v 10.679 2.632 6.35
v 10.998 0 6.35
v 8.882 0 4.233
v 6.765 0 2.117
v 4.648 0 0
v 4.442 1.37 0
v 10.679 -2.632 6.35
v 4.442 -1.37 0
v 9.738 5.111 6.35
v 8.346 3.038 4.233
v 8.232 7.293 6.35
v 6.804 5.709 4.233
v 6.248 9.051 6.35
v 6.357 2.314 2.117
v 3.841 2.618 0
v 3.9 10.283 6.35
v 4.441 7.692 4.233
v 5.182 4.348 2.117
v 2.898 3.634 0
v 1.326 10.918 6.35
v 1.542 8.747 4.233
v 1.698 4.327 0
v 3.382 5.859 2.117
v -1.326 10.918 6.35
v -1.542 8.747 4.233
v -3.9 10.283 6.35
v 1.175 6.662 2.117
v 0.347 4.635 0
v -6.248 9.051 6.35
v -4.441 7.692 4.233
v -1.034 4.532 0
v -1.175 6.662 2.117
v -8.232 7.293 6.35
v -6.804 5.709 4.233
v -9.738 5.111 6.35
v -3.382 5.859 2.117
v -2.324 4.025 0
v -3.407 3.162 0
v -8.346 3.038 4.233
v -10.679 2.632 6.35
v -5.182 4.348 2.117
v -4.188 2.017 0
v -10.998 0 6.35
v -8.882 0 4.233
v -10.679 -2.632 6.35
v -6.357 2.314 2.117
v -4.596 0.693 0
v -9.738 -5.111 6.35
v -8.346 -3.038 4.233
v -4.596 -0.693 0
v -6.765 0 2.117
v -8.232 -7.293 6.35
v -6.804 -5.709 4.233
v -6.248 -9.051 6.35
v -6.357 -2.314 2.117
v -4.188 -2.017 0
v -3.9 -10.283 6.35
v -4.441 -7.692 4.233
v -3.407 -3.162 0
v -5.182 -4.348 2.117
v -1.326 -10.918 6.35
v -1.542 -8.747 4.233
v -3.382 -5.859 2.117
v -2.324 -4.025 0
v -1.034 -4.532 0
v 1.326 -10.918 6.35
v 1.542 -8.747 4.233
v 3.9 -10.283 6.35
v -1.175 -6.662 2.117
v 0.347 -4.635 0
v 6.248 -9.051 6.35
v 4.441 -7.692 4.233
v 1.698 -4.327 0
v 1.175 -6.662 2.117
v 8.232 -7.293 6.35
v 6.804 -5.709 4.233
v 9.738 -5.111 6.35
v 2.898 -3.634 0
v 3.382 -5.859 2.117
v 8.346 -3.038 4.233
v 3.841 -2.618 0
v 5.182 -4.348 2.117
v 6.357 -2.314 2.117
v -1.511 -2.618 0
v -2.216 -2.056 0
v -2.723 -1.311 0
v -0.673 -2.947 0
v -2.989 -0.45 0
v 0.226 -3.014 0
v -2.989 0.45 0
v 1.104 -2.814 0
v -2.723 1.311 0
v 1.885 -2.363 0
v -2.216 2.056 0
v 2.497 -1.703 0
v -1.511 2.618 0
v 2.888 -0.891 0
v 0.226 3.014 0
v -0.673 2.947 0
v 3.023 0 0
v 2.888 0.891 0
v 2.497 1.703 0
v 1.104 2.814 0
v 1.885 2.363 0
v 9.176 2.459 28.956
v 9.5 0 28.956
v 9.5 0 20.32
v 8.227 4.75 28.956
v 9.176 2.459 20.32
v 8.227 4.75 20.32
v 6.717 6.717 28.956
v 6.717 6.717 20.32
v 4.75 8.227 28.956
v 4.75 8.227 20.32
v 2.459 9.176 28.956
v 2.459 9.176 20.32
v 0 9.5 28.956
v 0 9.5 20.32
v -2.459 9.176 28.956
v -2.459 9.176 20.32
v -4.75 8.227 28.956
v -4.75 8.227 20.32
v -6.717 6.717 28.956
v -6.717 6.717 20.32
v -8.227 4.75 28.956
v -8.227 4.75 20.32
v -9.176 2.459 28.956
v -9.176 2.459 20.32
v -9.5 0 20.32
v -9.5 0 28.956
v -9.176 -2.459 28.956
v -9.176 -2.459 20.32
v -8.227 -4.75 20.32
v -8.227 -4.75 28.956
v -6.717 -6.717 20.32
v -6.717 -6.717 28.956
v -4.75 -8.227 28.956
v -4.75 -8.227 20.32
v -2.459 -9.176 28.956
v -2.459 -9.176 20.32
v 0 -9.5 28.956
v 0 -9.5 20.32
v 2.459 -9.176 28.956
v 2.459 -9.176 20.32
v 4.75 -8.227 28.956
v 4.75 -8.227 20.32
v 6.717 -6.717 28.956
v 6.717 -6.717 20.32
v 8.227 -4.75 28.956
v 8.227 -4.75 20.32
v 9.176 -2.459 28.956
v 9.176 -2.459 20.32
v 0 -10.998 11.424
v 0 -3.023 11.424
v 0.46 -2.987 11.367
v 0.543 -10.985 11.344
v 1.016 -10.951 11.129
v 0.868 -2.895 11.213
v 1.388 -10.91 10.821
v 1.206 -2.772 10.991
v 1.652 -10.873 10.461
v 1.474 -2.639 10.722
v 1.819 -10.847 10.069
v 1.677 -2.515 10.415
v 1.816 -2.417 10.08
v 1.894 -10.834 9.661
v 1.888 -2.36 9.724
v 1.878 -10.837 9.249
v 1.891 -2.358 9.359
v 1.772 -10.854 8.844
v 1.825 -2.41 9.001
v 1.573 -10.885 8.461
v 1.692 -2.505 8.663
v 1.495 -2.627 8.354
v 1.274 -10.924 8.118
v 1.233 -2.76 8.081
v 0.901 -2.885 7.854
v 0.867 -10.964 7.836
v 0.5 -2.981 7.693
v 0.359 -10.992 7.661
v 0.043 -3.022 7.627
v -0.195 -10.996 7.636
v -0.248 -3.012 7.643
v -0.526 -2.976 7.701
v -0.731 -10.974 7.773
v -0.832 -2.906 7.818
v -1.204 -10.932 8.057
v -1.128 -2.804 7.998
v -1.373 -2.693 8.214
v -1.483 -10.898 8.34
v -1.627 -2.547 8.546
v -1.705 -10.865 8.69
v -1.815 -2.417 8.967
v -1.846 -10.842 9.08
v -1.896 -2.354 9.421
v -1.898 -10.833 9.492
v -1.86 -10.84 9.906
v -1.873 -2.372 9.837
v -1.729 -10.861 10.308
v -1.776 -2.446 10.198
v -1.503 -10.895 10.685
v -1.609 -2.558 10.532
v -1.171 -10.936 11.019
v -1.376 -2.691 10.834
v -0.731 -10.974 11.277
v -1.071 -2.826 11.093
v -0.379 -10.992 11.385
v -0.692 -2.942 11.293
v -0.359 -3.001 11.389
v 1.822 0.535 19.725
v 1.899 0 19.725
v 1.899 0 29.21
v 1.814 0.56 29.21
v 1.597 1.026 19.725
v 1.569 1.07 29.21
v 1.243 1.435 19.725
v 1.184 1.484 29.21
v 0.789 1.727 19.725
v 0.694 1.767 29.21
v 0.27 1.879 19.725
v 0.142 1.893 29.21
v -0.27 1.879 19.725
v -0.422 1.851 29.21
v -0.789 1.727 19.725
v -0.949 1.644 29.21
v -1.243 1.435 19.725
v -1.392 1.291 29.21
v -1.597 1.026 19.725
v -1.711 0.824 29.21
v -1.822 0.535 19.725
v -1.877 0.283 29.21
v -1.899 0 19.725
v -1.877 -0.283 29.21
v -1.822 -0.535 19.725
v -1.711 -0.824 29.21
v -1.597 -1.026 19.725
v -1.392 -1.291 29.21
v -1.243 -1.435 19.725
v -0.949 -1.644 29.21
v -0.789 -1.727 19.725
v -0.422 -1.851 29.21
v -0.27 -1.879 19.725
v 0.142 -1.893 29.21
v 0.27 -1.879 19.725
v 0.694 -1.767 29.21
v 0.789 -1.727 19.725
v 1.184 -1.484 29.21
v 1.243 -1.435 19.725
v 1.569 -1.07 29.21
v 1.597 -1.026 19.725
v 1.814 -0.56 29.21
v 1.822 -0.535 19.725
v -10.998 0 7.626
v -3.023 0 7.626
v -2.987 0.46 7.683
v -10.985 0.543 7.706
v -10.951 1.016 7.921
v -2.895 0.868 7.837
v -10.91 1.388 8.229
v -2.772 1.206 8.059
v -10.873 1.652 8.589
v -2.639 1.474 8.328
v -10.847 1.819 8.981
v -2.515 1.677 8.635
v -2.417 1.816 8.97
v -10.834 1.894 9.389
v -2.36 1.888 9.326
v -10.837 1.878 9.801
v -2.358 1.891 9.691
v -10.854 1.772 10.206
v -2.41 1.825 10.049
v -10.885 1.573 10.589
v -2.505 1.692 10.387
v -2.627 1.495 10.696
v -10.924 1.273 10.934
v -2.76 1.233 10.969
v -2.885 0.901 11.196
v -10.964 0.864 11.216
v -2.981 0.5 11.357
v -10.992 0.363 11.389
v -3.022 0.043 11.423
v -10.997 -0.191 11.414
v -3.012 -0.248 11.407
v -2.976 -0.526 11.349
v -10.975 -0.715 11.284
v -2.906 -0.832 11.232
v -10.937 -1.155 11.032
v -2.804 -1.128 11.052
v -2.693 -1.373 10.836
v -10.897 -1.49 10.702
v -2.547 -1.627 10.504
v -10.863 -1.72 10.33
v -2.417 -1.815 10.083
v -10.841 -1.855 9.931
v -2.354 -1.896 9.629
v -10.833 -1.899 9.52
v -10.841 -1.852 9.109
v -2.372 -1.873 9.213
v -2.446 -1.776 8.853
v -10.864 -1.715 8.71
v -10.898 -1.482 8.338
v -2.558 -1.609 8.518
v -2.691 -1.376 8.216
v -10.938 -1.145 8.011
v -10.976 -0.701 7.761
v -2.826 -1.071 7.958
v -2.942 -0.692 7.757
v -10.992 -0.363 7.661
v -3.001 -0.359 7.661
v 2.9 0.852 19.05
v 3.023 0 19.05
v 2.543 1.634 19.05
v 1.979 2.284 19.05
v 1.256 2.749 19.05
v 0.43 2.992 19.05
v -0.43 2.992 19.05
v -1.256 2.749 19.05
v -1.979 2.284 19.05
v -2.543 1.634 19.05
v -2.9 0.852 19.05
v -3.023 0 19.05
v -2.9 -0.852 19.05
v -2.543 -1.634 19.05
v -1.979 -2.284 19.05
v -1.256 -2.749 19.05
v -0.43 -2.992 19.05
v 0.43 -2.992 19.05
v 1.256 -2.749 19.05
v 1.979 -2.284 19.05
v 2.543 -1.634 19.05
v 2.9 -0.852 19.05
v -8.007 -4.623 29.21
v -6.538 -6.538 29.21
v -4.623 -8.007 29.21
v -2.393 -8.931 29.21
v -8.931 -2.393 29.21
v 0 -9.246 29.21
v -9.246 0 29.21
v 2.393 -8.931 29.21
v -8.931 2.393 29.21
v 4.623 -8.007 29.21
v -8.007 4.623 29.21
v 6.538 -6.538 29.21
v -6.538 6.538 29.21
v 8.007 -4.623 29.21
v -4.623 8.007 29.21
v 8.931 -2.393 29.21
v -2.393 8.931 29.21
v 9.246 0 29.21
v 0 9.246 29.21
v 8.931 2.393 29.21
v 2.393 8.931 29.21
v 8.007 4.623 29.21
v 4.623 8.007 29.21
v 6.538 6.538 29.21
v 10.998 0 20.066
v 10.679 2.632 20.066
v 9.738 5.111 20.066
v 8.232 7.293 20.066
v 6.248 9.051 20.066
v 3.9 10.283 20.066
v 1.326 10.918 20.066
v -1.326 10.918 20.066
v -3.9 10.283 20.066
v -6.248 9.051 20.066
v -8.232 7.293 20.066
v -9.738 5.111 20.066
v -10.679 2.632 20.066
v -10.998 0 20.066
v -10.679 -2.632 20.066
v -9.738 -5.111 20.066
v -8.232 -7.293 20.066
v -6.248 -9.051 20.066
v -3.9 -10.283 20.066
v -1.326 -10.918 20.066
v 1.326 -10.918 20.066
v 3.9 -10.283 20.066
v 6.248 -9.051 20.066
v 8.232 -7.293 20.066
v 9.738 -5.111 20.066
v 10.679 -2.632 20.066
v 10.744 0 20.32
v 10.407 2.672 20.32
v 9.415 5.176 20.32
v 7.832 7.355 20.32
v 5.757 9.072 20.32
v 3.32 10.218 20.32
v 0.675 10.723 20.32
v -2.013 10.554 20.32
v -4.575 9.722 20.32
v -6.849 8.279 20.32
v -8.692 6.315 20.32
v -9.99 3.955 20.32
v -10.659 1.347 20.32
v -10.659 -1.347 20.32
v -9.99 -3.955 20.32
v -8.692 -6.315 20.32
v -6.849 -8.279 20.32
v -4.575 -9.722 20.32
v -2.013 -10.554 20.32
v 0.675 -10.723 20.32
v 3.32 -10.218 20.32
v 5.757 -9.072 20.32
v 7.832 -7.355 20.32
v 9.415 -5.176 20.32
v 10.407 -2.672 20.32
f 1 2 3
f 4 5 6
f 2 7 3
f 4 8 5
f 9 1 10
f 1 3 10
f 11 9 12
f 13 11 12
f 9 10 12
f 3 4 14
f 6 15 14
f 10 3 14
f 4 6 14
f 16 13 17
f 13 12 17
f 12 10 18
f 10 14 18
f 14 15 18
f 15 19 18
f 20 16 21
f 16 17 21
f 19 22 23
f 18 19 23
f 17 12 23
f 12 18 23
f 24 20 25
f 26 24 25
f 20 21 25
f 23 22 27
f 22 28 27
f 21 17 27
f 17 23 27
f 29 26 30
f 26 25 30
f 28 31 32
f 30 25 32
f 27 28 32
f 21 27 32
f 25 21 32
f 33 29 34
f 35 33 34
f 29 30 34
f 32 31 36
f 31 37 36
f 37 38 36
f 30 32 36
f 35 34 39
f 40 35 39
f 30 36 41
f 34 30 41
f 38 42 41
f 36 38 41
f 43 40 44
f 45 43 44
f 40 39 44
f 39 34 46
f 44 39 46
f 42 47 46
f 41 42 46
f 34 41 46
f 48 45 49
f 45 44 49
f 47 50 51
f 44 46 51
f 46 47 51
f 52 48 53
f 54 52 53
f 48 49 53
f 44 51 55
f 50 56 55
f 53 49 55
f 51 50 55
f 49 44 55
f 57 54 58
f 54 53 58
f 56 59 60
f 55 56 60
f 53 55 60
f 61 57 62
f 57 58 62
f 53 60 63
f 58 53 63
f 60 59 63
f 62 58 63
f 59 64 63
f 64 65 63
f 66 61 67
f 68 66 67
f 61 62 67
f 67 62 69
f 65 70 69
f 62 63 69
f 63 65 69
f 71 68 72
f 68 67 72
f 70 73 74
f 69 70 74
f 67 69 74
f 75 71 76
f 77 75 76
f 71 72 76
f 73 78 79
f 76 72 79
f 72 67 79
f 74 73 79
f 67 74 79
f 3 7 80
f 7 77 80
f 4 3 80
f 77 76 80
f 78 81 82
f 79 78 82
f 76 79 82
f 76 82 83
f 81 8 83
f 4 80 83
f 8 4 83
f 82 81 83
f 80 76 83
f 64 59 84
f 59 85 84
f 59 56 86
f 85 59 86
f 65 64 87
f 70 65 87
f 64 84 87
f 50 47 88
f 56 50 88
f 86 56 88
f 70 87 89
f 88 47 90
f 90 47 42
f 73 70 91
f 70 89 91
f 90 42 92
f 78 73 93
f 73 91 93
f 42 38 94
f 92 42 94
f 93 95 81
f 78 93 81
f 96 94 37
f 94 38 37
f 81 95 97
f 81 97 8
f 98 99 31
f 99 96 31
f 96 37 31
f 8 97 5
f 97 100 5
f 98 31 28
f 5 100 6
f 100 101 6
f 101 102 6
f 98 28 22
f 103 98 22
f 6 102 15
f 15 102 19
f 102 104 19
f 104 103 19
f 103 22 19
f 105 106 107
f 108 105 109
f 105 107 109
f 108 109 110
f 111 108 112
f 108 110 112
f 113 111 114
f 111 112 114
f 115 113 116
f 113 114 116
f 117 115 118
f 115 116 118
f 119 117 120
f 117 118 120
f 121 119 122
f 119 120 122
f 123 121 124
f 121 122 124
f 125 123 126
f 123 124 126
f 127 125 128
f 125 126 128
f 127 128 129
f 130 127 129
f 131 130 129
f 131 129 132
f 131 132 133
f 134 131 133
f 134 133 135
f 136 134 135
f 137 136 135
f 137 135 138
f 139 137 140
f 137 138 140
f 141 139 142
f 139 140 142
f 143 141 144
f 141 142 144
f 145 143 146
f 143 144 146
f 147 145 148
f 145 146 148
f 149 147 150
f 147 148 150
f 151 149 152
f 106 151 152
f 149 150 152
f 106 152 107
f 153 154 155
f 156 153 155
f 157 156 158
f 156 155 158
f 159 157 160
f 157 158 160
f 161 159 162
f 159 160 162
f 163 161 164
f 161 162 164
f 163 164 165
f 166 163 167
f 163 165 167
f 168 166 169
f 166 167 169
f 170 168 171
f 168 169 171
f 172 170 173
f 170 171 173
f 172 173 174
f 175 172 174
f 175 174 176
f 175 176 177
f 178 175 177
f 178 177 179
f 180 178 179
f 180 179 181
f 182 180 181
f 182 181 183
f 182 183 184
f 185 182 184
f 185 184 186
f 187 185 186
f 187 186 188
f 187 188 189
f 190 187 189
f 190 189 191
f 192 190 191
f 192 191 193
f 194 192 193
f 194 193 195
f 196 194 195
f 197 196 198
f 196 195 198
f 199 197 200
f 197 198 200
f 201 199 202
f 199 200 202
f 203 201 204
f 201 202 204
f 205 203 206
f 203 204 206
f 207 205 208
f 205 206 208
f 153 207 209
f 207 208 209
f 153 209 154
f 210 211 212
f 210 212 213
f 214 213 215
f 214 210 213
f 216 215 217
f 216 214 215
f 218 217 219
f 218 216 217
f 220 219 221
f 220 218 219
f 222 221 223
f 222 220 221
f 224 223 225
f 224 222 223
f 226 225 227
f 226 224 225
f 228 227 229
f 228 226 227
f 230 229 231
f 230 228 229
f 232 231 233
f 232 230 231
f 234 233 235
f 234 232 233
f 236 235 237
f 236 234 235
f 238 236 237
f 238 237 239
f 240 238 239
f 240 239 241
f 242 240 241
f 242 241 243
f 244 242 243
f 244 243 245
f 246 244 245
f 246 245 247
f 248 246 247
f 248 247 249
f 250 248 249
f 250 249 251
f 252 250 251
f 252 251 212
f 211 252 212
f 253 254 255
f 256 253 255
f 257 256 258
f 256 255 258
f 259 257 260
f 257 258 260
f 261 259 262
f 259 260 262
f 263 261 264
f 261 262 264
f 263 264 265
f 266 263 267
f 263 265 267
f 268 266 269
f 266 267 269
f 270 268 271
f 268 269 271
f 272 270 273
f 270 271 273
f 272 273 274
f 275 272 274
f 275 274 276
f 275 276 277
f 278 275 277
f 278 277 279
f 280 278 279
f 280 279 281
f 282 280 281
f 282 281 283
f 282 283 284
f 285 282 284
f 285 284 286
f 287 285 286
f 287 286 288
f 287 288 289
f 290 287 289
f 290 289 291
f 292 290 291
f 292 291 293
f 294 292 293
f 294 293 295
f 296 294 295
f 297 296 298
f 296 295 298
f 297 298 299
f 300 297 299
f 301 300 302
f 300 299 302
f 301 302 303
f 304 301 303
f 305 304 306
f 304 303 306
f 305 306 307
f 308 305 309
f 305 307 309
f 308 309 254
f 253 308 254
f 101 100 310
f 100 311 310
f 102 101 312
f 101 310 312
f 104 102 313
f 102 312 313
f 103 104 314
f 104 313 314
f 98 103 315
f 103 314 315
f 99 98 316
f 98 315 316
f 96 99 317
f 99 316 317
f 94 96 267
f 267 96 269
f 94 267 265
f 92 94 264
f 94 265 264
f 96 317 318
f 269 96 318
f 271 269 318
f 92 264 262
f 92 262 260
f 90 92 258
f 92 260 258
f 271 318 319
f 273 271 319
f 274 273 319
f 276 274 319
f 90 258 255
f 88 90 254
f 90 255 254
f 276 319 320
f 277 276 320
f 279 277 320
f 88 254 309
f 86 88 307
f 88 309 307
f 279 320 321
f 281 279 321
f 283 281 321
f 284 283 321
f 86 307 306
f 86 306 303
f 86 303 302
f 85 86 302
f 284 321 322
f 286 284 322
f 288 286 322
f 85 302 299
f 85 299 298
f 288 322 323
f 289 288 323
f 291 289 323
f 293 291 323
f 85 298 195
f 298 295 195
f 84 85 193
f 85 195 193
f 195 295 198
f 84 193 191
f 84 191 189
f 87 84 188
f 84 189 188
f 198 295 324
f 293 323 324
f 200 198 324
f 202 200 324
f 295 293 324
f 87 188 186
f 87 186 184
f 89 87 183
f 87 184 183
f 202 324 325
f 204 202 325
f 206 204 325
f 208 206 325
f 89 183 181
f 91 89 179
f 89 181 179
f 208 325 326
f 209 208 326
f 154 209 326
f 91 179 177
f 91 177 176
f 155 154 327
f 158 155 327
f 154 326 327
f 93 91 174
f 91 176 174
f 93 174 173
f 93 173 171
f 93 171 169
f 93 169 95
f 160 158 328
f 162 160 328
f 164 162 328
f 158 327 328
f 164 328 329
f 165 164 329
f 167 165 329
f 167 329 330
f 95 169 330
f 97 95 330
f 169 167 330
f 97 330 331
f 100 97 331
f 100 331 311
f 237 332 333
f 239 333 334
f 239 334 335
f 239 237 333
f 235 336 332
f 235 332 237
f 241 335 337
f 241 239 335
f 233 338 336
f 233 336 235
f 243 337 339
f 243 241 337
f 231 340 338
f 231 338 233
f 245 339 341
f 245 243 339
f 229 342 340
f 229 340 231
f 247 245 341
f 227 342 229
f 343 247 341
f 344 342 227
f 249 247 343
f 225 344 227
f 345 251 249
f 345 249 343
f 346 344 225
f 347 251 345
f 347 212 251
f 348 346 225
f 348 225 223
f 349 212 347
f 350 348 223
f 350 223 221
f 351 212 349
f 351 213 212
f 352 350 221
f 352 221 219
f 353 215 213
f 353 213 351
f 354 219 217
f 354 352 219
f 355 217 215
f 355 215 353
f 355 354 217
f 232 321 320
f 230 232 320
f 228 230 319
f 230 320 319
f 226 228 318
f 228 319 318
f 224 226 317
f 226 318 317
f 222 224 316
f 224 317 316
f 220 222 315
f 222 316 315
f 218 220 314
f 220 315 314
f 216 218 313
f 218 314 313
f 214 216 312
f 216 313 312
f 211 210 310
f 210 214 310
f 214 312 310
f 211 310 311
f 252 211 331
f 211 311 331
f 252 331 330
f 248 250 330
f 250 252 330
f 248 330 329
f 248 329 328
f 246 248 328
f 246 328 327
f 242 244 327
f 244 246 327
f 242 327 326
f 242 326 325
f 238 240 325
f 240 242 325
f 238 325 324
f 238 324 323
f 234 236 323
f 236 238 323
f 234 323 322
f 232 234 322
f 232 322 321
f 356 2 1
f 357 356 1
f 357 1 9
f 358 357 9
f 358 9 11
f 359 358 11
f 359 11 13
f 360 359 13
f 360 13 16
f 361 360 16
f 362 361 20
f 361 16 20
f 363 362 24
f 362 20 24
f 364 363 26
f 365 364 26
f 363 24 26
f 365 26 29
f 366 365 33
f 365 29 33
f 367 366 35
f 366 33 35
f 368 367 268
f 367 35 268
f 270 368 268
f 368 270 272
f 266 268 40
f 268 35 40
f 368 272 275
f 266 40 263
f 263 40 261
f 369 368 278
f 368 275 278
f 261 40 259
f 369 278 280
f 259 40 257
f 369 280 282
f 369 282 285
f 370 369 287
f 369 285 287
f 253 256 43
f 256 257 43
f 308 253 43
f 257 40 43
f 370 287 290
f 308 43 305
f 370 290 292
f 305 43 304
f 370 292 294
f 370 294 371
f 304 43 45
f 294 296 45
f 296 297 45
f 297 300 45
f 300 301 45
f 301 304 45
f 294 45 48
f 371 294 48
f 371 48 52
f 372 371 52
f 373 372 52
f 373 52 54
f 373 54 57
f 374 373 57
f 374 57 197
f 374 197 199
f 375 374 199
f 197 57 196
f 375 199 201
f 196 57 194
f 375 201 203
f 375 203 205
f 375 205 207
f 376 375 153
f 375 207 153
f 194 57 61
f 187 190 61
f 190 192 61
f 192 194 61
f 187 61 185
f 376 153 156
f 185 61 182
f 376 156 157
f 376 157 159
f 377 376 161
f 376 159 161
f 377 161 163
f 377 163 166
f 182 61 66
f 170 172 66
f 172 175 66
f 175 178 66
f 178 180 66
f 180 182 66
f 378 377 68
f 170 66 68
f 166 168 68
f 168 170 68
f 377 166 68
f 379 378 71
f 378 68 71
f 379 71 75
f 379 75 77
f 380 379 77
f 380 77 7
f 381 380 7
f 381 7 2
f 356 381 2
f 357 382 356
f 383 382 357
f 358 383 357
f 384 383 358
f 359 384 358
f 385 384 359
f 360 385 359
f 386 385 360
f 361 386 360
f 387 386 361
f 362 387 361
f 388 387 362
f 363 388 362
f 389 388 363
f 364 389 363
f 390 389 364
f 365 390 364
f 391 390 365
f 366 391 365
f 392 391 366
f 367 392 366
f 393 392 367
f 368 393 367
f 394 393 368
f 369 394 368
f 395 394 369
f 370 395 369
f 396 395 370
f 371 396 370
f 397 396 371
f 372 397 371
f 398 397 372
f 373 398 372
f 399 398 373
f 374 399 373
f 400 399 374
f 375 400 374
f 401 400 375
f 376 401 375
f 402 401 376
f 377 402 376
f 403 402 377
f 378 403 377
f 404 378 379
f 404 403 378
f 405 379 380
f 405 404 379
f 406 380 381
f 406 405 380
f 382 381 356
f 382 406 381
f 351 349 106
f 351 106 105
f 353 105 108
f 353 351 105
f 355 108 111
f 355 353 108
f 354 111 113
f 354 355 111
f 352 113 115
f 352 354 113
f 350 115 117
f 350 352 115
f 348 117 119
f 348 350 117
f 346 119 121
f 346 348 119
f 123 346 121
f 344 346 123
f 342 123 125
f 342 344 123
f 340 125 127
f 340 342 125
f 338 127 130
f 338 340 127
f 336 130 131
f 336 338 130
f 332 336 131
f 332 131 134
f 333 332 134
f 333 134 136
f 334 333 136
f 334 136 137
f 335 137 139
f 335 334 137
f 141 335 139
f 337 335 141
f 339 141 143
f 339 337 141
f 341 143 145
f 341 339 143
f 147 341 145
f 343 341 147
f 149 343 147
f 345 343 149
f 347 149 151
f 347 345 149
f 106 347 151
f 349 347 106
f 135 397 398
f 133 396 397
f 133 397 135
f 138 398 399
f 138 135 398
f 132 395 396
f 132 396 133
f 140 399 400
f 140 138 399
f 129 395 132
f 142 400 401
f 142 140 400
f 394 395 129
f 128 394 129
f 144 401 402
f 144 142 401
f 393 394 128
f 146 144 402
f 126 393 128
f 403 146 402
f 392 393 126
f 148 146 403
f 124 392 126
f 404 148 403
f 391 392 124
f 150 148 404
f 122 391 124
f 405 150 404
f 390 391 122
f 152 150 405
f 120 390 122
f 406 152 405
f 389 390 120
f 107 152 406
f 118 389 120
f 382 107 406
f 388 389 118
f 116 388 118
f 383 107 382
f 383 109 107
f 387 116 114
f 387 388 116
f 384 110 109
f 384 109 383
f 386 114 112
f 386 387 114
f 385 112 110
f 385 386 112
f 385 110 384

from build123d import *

# Parameters (mm, degrees)
SKETCH1_R                    = 10.9982
BOSS_EXTRUDE1_DEPTH          = 20.32
SKETCH2_R                    = 9.4996
BOSS_EXTRUDE2_DEPTH          = 8.89
B_0_238_DIAMETER_HOLE1_D     = 6.0452
B_0_238_DIAMETER_HOLE1_DEPTH = 19.05
B_0_238_DIAMETER_HOLE1_TIP   = 1.816161307
BOSS_EXTRUDE5_START          = -9.484662807
BOSS_EXTRUDE5_OUTLINE_R      = 1.89865
BOSS_EXTRUDE5_DEPTH          = 9.484662807
SKETCH11_R                   = 1.89865
CUT_EXTRUDE1_DEPTH           = 34.092973672
SKETCH12_R                   = 1.89865
CUT_EXTRUDE2_DEPTH           = 34.092973739
CHAMFER1_SIZE                = 6.35
CHAMFER2_SIZE                = 0.254
CHAMFER3_SIZE                = 0.254


# Read off the part's stored shape, not the designer's step: Boss-Extrude5
with BuildPart() as part:
    # Sketch1 → Boss-Extrude1 (new body)
    with BuildSketch(Plane.XY):
        Circle(SKETCH1_R)
    extrude(amount=BOSS_EXTRUDE1_DEPTH)

    # Sketch2 → Boss-Extrude2 (add)
    with BuildSketch(Plane.XY.offset(20.32)):
        Circle(SKETCH2_R)
    extrude(amount=BOSS_EXTRUDE2_DEPTH)

    # B (0.238) Diameter Hole1
    with Locations(Plane(origin=(0, 0, 0), x_dir=(-1, 0, 0), z_dir=(0, 0, -1))):
        with Locations((0, 0)):
            Hole(B_0_238_DIAMETER_HOLE1_D / 2, depth=B_0_238_DIAMETER_HOLE1_DEPTH)
            with Locations((0, 0, -(B_0_238_DIAMETER_HOLE1_DEPTH + B_0_238_DIAMETER_HOLE1_TIP / 2))):  # 118° drill point
                Cone(0, B_0_238_DIAMETER_HOLE1_D / 2, B_0_238_DIAMETER_HOLE1_TIP, mode=Mode.SUBTRACT)

    # Boss-Extrude5 outline → Boss-Extrude5 (cut)
    with BuildSketch(Plane.XY.offset(29.21).offset(BOSS_EXTRUDE5_START)):
        Circle(BOSS_EXTRUDE5_OUTLINE_R)
    extrude(amount=BOSS_EXTRUDE5_DEPTH, mode=Mode.SUBTRACT)

    # Sketch11 → Cut-Extrude1 (cut, through all)
    with BuildSketch(Plane(origin=(0, 0, 0), x_dir=(1, 0, 0), z_dir=(0, 1, 0))):
        with Locations(Location((0, -9.525, 0), (0, 0, 270))):
            Circle(SKETCH11_R)
    extrude(amount=-CUT_EXTRUDE1_DEPTH, mode=Mode.SUBTRACT)

    # Sketch12 → Cut-Extrude2 (cut, through all)
    with BuildSketch(Plane(origin=(0, 0, 0), x_dir=(0, 0, -1), z_dir=(1, 0, 0))):
        with Locations((-9.525, 0)):
            Circle(SKETCH12_R)
    extrude(amount=-CUT_EXTRUDE2_DEPTH, mode=Mode.SUBTRACT)

    # Chamfer1
    chamfer1_edges = [part.edges().sort_by_distance(p)[0] for p in [
        (-10.9982, 0, 0),
    ]]
    chamfer(chamfer1_edges, length=CHAMFER1_SIZE)

    # Chamfer2
    chamfer2_edges = [part.edges().sort_by_distance(p)[0] for p in [
        (-10.9982, 0, 20.32),
    ]]
    chamfer(chamfer2_edges, length=CHAMFER2_SIZE)

    # Chamfer3
    chamfer3_edges = [part.edges().sort_by_distance(p)[0] for p in [
        (-9.4996, 0, 29.21),
    ]]
    chamfer(chamfer3_edges, length=CHAMFER3_SIZE)


solid = part.part
